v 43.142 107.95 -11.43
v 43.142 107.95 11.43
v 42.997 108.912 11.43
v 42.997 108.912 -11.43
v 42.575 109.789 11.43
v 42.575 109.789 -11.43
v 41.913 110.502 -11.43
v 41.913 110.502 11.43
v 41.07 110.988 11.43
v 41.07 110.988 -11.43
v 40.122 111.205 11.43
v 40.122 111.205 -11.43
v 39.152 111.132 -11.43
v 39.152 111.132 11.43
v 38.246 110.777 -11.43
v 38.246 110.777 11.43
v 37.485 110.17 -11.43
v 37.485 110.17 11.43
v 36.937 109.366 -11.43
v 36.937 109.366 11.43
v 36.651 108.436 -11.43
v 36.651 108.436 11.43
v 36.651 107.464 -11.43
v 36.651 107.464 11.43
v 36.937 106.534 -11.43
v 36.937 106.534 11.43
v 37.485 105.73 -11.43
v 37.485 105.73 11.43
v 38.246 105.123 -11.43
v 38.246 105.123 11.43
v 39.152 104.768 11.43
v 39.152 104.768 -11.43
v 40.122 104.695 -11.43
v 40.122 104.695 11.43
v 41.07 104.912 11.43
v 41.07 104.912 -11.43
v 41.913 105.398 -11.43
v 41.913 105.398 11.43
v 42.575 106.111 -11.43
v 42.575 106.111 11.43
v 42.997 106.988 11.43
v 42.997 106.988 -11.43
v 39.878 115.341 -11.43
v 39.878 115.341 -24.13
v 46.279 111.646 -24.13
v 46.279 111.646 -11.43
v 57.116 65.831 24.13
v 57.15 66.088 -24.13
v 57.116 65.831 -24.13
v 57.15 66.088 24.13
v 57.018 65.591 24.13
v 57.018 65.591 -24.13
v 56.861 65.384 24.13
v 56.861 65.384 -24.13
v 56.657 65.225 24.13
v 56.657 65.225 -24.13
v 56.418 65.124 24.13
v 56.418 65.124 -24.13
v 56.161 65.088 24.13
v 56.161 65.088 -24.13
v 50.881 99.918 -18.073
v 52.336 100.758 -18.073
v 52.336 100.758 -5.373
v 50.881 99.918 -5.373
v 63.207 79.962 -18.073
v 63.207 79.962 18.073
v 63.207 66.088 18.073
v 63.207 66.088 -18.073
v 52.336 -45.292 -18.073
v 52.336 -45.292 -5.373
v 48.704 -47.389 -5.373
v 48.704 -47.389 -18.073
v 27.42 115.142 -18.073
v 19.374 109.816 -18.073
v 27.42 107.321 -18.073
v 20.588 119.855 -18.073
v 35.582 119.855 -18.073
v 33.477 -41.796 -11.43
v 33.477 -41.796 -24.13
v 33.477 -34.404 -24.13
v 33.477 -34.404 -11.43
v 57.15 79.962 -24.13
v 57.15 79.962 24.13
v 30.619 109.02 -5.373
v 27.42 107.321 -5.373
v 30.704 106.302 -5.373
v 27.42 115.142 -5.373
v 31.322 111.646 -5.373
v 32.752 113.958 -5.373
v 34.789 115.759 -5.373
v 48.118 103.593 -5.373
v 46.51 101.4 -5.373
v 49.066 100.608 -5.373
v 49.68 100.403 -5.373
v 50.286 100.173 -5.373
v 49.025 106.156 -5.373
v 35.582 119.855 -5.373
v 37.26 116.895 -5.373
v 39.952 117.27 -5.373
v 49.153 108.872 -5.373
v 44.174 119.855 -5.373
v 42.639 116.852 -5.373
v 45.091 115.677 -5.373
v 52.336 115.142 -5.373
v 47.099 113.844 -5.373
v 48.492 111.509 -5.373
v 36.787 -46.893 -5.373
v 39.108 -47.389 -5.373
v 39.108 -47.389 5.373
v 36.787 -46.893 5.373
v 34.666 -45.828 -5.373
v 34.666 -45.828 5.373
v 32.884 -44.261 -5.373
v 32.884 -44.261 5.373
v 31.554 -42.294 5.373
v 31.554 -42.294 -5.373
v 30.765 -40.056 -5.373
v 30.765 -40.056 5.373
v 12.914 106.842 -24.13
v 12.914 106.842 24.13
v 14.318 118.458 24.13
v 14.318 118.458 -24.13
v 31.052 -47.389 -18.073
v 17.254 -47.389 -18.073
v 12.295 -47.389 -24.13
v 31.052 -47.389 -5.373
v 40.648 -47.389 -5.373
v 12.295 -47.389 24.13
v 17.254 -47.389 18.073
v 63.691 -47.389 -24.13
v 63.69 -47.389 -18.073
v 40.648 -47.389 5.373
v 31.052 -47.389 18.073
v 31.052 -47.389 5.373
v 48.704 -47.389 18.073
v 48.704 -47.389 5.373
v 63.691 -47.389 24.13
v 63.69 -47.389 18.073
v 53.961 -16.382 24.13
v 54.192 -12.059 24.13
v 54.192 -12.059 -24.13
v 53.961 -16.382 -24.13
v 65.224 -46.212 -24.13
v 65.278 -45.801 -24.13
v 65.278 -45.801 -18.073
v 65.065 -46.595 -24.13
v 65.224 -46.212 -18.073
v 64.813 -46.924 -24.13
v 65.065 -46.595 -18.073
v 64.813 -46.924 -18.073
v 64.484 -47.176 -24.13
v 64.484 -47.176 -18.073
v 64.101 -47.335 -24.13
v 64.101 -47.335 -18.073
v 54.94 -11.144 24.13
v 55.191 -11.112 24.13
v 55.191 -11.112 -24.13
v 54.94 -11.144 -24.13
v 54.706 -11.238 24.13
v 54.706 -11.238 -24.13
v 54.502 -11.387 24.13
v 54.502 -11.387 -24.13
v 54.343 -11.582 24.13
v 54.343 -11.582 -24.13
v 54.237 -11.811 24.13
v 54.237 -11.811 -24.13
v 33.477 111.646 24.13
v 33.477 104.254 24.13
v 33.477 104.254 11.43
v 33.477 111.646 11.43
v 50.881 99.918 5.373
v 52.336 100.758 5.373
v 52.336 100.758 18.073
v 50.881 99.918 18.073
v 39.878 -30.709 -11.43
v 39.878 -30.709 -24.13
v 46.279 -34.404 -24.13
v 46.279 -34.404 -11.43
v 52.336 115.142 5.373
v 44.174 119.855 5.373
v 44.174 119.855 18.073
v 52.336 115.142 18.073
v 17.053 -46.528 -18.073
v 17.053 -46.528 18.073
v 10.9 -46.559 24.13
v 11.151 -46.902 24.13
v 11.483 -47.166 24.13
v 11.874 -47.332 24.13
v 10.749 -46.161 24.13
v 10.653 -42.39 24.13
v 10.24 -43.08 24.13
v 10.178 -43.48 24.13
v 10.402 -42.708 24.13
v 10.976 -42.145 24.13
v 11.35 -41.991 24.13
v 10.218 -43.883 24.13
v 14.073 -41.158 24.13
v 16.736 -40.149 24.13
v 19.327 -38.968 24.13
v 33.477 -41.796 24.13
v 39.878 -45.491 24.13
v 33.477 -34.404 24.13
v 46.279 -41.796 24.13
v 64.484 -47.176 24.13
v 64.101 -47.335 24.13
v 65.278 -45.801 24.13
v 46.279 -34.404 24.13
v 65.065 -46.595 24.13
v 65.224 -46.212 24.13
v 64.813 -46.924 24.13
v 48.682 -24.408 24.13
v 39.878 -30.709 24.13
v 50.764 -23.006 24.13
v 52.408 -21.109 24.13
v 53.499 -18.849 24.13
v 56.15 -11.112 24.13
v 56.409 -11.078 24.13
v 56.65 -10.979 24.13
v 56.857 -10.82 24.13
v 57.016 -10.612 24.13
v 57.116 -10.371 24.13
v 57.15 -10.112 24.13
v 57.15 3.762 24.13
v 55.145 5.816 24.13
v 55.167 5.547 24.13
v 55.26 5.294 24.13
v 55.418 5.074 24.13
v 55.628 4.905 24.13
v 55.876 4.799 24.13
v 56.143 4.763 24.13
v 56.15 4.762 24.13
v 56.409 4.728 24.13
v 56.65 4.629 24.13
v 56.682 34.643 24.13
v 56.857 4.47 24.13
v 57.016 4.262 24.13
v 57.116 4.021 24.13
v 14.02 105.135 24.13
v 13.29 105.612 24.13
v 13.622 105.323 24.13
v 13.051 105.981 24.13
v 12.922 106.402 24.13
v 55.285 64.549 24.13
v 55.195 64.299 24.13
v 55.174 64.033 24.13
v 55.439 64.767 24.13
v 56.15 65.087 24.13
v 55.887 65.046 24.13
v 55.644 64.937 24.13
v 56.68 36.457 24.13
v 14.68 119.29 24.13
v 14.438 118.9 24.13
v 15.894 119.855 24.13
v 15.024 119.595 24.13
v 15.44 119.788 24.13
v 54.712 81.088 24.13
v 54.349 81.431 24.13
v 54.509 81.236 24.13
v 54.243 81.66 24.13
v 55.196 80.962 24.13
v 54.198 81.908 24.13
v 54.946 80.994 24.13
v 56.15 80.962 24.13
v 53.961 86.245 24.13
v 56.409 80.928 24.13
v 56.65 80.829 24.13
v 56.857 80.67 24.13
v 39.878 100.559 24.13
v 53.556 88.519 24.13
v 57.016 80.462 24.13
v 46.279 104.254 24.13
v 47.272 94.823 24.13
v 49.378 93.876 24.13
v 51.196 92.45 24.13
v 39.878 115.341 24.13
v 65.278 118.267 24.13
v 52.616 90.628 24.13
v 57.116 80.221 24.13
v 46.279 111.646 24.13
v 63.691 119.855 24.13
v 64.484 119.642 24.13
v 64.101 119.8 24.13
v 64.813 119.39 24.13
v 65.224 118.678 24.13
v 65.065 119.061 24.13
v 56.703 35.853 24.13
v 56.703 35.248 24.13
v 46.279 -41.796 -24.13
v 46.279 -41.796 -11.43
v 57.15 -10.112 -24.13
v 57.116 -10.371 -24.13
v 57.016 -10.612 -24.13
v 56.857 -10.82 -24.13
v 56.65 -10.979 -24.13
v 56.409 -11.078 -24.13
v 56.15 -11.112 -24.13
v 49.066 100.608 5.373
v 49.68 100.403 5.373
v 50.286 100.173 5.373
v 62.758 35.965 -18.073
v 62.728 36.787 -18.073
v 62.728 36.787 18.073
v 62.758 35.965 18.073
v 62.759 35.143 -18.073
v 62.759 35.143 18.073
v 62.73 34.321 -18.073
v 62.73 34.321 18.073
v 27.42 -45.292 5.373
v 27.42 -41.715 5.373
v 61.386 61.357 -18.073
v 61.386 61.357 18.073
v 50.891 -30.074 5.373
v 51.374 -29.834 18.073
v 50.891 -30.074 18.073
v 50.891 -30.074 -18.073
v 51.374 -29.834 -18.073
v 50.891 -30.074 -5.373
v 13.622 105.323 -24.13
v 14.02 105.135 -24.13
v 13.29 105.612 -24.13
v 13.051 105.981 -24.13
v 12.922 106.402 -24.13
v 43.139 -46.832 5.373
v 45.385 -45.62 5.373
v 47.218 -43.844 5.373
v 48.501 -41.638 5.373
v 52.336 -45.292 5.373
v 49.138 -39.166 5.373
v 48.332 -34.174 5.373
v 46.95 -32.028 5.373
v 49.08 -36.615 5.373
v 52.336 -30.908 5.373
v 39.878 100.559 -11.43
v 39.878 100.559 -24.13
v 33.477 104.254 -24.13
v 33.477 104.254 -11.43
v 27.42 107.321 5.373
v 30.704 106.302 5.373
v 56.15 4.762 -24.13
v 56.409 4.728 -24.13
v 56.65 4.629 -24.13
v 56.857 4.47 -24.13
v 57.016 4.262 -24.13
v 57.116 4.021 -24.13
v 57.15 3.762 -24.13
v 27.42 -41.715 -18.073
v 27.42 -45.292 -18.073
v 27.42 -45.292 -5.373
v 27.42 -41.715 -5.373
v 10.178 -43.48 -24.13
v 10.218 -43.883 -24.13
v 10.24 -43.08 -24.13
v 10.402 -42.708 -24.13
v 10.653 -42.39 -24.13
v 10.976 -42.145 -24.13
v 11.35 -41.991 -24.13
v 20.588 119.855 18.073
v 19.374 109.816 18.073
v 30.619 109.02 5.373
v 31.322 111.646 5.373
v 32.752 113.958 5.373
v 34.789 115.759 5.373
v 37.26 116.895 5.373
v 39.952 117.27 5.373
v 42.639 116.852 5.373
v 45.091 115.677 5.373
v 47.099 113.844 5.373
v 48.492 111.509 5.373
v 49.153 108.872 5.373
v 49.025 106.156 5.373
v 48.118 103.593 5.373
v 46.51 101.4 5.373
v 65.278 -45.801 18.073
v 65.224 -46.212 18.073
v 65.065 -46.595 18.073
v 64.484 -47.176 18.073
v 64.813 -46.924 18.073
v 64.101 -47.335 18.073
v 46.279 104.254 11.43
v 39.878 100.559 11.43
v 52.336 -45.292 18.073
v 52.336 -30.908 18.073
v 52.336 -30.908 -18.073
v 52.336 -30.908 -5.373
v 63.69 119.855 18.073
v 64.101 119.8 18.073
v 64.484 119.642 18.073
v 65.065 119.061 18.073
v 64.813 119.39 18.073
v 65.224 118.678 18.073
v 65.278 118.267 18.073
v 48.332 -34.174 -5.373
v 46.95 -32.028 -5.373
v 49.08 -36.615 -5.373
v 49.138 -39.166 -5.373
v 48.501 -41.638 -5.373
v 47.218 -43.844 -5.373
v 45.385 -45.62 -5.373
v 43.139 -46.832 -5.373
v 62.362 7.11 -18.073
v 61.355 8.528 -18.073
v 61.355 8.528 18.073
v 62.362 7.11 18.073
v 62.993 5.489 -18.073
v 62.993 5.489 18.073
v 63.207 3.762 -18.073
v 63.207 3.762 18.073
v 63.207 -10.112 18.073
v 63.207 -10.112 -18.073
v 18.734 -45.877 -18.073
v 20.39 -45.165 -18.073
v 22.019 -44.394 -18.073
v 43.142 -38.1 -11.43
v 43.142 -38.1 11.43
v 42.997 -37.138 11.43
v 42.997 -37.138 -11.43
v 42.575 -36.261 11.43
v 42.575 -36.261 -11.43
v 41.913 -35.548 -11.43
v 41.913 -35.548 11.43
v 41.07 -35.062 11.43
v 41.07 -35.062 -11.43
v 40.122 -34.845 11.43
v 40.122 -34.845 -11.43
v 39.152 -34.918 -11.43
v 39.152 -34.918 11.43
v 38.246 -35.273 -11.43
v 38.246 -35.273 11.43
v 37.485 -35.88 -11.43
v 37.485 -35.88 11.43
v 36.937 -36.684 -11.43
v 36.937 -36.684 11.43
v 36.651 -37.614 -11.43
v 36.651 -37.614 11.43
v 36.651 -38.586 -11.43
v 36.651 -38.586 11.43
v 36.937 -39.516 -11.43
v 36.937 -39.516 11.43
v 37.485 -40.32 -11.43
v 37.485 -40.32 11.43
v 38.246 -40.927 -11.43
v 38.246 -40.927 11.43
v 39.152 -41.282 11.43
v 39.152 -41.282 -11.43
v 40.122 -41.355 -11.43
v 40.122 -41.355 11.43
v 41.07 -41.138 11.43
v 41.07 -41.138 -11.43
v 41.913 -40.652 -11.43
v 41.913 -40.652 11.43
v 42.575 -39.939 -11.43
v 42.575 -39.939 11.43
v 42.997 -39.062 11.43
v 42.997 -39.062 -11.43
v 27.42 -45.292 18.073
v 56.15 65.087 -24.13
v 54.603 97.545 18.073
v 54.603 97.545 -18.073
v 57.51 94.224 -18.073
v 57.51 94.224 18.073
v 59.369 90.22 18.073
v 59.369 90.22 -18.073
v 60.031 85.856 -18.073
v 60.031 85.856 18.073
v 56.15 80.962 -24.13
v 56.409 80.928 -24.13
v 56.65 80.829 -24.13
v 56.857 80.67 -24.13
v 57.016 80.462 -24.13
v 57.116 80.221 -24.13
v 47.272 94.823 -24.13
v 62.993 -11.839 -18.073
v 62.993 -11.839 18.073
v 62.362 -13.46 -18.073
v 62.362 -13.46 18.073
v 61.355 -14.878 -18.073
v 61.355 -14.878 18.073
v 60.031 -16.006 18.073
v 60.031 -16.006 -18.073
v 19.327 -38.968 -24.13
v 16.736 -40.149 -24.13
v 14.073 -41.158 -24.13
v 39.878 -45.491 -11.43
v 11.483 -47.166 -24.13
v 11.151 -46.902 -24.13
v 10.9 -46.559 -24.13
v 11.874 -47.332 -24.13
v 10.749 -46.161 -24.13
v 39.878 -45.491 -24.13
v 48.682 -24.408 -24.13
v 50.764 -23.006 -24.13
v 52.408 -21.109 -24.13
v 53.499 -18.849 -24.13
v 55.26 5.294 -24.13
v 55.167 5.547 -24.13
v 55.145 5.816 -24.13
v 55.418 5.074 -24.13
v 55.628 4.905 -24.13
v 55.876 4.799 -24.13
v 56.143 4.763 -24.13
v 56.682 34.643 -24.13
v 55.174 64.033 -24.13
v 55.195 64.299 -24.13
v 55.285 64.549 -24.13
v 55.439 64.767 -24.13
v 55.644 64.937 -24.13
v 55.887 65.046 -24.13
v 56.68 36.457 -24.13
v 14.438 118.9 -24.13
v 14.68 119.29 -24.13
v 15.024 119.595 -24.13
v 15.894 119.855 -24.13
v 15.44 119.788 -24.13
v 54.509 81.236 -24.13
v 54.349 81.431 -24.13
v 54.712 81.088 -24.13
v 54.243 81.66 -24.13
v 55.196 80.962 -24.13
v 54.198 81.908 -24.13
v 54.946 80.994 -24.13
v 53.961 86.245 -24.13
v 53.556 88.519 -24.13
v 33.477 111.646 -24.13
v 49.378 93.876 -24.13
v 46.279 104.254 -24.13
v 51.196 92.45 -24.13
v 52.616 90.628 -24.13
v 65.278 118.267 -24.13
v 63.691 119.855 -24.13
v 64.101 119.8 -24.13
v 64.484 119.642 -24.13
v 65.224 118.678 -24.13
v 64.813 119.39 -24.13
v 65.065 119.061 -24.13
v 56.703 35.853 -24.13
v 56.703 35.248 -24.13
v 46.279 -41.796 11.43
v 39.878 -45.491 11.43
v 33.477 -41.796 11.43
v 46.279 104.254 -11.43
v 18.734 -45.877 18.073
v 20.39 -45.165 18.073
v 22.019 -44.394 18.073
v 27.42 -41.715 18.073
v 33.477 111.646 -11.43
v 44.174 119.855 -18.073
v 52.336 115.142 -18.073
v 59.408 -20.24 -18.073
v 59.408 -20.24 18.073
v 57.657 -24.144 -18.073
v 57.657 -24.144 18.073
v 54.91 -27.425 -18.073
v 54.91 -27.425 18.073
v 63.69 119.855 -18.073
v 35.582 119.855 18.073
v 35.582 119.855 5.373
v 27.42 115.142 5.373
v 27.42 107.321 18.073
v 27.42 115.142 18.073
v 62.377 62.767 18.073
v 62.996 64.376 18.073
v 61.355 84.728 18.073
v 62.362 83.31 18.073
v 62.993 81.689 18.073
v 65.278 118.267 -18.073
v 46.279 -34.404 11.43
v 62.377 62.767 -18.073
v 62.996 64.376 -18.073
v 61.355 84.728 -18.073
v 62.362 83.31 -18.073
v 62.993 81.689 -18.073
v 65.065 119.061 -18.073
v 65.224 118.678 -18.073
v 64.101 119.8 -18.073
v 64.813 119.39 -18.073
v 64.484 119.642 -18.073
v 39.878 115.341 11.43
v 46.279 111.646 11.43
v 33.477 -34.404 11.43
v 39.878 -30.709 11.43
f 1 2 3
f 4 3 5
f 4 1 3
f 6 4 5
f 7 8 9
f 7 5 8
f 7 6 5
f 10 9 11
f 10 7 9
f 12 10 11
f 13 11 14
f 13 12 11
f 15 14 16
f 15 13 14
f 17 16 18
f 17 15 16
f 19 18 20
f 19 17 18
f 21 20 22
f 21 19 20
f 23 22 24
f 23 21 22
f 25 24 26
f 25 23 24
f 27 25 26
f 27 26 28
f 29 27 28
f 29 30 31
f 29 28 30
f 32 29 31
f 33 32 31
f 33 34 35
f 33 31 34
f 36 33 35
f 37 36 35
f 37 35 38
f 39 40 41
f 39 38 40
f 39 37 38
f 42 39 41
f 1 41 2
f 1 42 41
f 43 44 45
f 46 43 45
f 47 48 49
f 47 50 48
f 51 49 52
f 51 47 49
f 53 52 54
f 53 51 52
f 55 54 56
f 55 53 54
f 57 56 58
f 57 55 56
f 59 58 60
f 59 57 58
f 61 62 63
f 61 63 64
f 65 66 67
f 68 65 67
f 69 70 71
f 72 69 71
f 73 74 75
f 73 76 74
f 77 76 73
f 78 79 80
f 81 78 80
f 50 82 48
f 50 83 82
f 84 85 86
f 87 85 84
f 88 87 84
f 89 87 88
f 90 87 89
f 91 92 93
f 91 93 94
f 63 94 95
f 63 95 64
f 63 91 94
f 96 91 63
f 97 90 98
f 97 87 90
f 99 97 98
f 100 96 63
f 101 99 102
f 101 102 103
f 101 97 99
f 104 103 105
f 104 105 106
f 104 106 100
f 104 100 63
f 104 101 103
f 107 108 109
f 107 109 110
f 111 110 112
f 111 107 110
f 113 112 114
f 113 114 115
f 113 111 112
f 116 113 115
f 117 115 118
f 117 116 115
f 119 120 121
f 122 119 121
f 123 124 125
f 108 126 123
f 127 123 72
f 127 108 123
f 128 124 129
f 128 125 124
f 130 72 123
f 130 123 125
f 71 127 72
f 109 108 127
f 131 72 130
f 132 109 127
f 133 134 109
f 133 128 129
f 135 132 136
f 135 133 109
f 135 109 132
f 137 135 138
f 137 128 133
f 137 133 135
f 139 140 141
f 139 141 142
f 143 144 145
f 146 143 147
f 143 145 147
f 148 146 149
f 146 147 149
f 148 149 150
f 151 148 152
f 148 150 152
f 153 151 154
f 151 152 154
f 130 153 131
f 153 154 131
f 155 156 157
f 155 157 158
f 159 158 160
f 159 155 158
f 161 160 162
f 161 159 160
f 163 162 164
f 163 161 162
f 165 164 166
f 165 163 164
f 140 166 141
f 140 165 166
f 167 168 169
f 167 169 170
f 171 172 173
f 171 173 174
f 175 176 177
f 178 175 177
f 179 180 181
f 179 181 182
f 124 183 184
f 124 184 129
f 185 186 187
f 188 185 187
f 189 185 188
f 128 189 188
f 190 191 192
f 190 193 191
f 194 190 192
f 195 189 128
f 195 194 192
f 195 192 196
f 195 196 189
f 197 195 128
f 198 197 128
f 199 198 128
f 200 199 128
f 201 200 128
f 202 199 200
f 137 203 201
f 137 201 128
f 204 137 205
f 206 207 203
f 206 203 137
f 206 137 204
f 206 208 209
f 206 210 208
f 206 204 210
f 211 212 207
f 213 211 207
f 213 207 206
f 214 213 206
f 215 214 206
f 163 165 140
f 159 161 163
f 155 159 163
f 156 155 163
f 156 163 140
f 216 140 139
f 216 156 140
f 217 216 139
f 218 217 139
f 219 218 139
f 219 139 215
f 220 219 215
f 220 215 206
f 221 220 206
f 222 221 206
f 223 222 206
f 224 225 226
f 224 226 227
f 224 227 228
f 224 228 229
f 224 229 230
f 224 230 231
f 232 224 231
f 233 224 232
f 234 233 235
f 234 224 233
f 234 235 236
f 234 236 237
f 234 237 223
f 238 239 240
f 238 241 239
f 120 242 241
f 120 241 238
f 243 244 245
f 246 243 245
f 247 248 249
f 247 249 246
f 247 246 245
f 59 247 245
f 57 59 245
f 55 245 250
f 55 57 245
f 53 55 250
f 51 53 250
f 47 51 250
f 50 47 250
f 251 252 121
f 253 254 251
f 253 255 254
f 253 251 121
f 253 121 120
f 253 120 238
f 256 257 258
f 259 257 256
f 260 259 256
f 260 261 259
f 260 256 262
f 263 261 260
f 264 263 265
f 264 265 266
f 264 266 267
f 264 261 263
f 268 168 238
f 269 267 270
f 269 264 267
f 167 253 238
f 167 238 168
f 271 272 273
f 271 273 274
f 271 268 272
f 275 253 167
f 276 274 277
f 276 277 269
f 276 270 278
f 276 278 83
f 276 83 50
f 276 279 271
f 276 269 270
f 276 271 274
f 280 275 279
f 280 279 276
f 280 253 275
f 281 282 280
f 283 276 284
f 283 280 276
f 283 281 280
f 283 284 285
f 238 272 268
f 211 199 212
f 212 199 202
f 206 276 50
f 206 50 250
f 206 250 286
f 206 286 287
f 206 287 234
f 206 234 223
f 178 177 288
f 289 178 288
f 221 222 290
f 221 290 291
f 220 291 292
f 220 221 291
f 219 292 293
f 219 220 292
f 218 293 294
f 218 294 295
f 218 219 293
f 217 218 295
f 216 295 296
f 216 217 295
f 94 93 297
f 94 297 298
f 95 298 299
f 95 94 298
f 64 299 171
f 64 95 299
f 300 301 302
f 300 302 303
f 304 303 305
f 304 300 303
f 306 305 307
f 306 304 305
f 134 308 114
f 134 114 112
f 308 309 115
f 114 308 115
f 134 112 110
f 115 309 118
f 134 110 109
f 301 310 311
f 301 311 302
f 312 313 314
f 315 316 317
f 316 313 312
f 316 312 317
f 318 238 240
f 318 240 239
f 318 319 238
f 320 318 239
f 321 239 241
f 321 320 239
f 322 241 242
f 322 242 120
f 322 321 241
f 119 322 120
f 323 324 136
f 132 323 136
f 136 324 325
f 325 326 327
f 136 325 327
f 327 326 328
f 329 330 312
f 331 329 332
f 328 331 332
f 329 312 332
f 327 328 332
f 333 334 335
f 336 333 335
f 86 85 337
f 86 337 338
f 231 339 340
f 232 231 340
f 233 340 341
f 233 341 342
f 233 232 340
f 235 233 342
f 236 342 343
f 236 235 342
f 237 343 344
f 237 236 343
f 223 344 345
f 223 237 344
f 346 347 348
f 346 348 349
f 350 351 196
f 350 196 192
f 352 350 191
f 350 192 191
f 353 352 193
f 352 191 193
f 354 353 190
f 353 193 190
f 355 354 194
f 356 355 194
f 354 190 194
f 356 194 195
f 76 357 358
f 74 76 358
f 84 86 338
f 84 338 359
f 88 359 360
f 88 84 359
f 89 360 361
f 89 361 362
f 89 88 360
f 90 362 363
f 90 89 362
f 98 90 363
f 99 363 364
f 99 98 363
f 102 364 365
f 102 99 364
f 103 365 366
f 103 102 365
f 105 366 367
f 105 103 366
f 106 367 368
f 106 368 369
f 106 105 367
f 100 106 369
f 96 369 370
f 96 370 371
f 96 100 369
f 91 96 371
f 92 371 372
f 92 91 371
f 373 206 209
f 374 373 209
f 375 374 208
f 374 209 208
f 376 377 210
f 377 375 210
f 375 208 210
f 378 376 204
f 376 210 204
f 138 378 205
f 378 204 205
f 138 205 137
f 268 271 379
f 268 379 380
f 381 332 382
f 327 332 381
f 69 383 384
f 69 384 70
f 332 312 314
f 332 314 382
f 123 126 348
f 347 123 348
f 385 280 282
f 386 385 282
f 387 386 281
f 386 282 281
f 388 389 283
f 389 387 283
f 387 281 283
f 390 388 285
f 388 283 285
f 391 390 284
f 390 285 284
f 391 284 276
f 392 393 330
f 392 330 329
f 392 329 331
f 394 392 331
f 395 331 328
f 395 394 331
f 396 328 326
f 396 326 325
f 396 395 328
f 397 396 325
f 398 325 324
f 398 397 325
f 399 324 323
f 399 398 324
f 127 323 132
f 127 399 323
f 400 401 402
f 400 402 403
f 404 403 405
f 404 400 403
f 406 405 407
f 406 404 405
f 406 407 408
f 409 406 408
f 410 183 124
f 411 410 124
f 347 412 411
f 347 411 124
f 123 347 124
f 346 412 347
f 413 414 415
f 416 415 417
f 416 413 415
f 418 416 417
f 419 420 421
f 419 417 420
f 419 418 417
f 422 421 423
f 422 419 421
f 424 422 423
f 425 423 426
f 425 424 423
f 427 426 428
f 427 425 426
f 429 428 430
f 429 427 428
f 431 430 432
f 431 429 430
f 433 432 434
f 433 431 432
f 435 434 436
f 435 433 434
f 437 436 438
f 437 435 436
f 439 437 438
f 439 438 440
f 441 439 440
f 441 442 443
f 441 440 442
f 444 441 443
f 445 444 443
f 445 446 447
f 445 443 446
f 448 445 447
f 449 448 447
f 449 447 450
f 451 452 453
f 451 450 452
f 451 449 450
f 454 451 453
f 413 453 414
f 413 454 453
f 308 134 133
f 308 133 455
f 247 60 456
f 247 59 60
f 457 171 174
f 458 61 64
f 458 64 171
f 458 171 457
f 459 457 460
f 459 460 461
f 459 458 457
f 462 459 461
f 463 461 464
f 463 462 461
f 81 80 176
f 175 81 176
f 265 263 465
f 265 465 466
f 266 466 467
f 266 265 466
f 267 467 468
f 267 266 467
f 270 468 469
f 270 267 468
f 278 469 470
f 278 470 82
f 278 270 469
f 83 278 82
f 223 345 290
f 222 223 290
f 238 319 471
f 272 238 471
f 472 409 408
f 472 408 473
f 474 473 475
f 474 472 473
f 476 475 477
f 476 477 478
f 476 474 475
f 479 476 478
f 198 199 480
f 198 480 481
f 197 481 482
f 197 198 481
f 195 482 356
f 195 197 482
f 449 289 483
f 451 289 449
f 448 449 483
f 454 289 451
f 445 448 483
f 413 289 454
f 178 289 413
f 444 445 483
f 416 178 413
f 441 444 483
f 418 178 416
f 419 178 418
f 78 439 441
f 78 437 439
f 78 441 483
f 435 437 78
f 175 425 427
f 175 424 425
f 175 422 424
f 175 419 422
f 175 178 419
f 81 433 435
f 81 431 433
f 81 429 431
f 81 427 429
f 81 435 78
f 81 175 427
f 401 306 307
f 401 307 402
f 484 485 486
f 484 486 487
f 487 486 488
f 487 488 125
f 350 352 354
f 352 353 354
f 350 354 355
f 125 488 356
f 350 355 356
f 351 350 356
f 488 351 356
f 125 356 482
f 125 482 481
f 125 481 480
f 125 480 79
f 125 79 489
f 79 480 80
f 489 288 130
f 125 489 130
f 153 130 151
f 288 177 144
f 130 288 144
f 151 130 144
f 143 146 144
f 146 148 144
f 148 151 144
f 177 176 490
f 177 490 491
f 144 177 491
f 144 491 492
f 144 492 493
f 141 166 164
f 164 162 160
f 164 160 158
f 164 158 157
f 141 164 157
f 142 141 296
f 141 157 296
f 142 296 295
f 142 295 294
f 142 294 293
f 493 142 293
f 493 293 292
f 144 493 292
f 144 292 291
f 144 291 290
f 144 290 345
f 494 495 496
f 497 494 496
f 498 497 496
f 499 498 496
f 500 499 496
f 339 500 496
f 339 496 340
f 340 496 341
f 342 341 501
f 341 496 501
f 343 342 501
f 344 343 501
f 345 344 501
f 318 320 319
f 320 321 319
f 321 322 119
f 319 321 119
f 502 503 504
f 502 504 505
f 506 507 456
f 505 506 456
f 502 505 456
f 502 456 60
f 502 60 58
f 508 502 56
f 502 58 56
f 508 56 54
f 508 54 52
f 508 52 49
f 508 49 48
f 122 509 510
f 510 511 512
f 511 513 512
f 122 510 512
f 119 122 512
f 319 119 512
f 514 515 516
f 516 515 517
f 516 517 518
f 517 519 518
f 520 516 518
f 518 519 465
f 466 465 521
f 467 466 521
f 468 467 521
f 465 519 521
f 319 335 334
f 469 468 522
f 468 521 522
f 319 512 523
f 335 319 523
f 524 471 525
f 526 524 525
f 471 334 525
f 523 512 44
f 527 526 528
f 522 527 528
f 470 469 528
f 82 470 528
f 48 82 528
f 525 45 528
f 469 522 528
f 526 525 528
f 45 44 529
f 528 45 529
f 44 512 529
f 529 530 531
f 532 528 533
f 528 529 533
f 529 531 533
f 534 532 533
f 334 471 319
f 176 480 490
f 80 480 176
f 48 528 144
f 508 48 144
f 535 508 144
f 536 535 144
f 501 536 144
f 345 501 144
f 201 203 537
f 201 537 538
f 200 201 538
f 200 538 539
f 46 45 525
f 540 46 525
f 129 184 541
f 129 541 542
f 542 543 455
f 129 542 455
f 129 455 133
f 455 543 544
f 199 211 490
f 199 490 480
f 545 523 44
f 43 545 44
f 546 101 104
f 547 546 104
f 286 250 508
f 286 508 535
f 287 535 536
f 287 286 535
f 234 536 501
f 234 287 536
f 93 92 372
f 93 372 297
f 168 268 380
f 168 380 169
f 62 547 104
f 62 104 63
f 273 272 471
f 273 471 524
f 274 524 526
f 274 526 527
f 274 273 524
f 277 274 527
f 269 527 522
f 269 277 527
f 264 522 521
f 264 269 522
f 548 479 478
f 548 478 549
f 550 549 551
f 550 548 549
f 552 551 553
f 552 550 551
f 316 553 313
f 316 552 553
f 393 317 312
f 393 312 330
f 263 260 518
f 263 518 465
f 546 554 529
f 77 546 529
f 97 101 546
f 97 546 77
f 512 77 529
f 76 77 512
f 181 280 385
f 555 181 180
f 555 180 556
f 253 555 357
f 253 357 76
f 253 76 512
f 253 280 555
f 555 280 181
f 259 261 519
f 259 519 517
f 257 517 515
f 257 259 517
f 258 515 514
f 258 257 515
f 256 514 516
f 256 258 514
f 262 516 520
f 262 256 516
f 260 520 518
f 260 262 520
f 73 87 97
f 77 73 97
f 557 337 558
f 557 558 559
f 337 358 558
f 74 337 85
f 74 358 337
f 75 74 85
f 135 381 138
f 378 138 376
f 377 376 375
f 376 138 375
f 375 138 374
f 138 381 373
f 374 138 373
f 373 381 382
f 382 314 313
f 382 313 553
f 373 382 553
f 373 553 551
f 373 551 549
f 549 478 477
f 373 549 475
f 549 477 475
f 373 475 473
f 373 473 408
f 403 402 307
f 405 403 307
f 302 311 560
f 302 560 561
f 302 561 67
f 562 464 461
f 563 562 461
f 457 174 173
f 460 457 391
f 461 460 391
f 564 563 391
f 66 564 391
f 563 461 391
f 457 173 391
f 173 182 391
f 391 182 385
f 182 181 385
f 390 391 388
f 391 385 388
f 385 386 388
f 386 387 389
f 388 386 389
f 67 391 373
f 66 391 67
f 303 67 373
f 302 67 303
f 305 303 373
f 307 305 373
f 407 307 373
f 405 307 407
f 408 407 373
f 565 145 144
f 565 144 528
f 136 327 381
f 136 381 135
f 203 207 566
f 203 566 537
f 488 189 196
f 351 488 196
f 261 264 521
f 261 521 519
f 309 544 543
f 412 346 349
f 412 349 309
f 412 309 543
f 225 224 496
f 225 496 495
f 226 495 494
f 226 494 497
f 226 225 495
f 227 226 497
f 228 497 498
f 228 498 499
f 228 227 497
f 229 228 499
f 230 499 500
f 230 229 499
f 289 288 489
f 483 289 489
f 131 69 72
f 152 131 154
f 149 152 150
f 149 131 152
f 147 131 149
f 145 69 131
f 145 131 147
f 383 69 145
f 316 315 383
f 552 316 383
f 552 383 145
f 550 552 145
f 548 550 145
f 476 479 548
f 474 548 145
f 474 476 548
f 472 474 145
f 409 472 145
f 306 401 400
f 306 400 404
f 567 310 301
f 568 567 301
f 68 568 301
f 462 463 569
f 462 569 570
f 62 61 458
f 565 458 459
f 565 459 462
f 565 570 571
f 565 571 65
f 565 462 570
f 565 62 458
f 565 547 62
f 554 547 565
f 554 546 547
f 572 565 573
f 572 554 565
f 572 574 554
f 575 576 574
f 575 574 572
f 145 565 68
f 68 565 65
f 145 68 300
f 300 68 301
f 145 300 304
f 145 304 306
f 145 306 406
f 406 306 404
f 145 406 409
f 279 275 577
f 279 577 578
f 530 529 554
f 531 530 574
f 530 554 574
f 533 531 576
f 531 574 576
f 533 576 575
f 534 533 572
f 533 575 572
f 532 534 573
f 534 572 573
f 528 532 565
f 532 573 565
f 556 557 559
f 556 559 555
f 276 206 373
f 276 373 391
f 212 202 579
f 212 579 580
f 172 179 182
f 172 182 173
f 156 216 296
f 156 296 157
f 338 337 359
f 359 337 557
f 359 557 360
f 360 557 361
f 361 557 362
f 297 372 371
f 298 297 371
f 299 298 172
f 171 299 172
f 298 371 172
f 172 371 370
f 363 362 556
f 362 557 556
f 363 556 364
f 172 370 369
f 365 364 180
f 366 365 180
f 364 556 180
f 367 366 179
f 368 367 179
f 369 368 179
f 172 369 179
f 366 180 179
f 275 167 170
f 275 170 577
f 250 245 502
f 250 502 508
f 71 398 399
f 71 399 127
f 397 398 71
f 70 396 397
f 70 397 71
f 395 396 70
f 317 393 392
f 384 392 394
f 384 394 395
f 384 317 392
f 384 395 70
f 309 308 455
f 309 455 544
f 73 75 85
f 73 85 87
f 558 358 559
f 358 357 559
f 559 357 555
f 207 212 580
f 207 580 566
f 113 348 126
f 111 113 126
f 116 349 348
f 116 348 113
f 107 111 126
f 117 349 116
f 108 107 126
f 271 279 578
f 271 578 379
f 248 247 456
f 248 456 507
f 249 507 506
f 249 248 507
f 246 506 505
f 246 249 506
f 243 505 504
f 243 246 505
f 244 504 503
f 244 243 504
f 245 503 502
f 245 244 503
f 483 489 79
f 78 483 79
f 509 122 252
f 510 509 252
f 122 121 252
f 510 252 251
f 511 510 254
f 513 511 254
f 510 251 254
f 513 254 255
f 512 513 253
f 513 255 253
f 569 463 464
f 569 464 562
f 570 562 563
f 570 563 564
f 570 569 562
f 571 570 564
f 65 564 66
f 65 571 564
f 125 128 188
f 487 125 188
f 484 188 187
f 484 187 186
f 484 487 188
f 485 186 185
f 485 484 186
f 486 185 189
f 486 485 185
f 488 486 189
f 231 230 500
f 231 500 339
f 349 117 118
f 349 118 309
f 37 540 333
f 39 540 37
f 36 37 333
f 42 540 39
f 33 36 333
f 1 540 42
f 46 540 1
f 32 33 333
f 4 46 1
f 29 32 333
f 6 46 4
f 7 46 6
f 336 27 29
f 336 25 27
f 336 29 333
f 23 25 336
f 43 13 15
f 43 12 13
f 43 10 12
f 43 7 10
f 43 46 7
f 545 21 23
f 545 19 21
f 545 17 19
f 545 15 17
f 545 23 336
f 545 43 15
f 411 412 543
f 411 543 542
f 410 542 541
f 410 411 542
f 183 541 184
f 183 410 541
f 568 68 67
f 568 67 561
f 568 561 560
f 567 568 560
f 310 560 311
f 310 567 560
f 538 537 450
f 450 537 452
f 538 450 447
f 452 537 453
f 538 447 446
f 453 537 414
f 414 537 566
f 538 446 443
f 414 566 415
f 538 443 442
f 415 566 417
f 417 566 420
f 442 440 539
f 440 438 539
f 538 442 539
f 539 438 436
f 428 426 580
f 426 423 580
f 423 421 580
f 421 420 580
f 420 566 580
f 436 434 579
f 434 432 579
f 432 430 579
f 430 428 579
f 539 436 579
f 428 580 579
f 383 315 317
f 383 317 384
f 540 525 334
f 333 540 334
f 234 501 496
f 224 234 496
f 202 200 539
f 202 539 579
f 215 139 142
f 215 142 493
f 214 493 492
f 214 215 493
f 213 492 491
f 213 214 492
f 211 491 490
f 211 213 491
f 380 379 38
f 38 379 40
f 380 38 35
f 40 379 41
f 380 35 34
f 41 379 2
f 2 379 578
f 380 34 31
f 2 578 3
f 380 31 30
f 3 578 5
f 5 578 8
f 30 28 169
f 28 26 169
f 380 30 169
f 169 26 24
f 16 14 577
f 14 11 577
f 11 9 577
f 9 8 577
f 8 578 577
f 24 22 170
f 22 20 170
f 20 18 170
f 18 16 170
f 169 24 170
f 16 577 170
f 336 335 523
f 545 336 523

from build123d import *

# Parameters (mm, degrees)
BOSS_EXTRUDE1_DEPTH     = 24.13
CUT_EXTRUDE1_DEPTH      = 139.595056638
CUT_EXTRUDE1_DEPTH_BACK = 139.595056638
FILLET1_R               = 1.5875
CUT_EXTRUDE2_DEPTH      = 12.7
CUT_EXTRUDE3_DEPTH      = 139.595056638
CUT_EXTRUDE3_DEPTH_BACK = 139.595056638
SKETCH4_R               = 3.2639
SHELL1_START            = -18.073116
SHELL1_DEPTH            = 36.146232
SHELL1_START_2          = -5.373116
SHELL1_2_DEPTH          = 10.746232


# Read off the part's stored shape, not the designer's step: Shell1
with BuildPart() as part:
    # Sketch1 → Boss-Extrude1 (new, symmetric)
    with BuildSketch(Plane.XY):
        with BuildLine():
            Line((56.161313585, 65.087564001), (56.15, 65.087371974))
            ThreePointArc((56.15, 65.087371974), (55.438759683, 64.766920639), (55.174115771, 64.033084522))
            Line((55.174115771, 64.033084522), (56.680450554, 36.457041128))
            ThreePointArc((56.680450554, 36.457041128), (56.705496383, 35.550244887), (56.681639728, 34.643416582))
            Line((56.681639728, 34.643416582), (55.144848554, 5.815734008))
            ThreePointArc((55.144848554, 5.815734008), (55.417746823, 5.074471658), (56.143430652, 4.7625))
            Line((56.143430652, 4.7625), (56.149999968, 4.762499984))
            ThreePointArc((56.149999968, 4.762499984), (56.857106771, 4.469606766), (57.15, 3.762499968))
            Line((57.15, 3.762499968), (57.15, -10.112499968))
            ThreePointArc((57.15, -10.112499968), (56.857106771, -10.819606766), (56.149999968, -11.112499984))
            Line((56.149999968, -11.112499984), (55.190522202, -11.1125))
            ThreePointArc((55.190522202, -11.1125), (54.502493828, -11.386816202), (54.191940103, -12.059266056))
            Line((54.191940103, -12.059266056), (53.961494186, -16.382053603))
            ThreePointArc((53.961494186, -16.382053603), (52.407837698, -21.109352316), (48.682296217, -24.408070592))
            Line((48.682296217, -24.408070592), (19.327486058, -38.967689038))
            ThreePointArc((19.327486058, -38.967689038), (0, -43.4975), (-19.327486058, -38.967689038))
            Line((-19.327486058, -38.967689038), (-19.327486058, -47.388950103))
            Line((-19.327486058, -47.388950103), (65.278, -47.388950103))
            Line((65.278, -47.388950103), (65.278, 119.854559949))
            Line((65.278, 119.854559949), (-4.702524006, 119.854559949))
            Line((-4.702524006, 119.854559949), (-4.702524006, 108.02491605))
            ThreePointArc((-4.702524006, 108.02491605), (0, 108.7374), (4.702524006, 108.02491605))
            Line((4.702524006, 108.02491605), (47.271514403, 94.82250963))
            ThreePointArc((47.271514403, 94.82250963), (51.961130003, 91.582350175), (53.960821068, 86.244526329))
            Line((53.960821068, 86.244526329), (54.197705155, 81.907956584))
            ThreePointArc((54.197705155, 81.907956584), (54.508664182, 81.236365226), (55.196216585, 80.9625))
            Line((55.196216585, 80.9625), (56.149999984, 80.962499984))
            ThreePointArc((56.149999984, 80.962499984), (56.857106777, 80.669606761), (57.15, 79.962499968))
            Line((57.15, 79.962499968), (57.15, 66.087500032))
            ThreePointArc((57.15, 66.087500032), (56.8610955, 65.384404568), (56.161313585, 65.087564001))
        make_face()
    extrude(amount=BOSS_EXTRUDE1_DEPTH, both=True)

    # Sketch2 → Cut-Extrude1 (cut, two sides: drawn at the far end of the back side and taken through both)
    with BuildSketch(Plane.XY.offset(-CUT_EXTRUDE1_DEPTH_BACK)):
        Polygon((0, 0), (16.649604997, 137.747881839), (-33.336773011, 132.313158031), (-32.126746787, -67.704176811), (15.765326083, -67.704176811), align=None)
    extrude(amount=CUT_EXTRUDE1_DEPTH + CUT_EXTRUDE1_DEPTH_BACK, mode=Mode.SUBTRACT)

    # Fillet1
    fillet1_edges = [part.edges().sort_by_distance(p)[0] for p in [
        (65.278, 119.854559949, 0),
        (65.278, -47.388950103, 0),
        (11.034802966, -47.388950103, 0),
        (9.864742858, -42.364128158, 0),
        (12.755119811, 105.527472687, 0),
        (14.486836775, 119.854559949, 0),
    ]]
    fillet(fillet1_edges, radius=FILLET1_R)

    # Sketch3 → Cut-Extrude2 (cut)
    with BuildSketch(Plane(origin=(0, 0, -24.13), x_dir=(-1, 0, 0), z_dir=(0, 0, -1))):
        Polygon((-39.878, -30.708992794), (-46.2788, -34.404496397), (-46.2788, -41.795503603), (-39.878, -45.491007206), (-33.4772, -41.795503603), (-33.4772, -34.404496397), align=None)
        Polygon((-33.4772, 111.645503603), (-39.878, 115.341007206), (-46.2788, 111.645503603), (-46.2788, 104.254496397), (-39.878, 100.558992794), (-33.4772, 104.254496397), align=None)
    cut_extrude2 = extrude(amount=-CUT_EXTRUDE2_DEPTH, mode=Mode.SUBTRACT)

    # Mirror1: Cut-Extrude2 across plane
    add(cut_extrude2.mirror(Plane.XY), mode=Mode.SUBTRACT)

    # Sketch4 → Cut-Extrude3 (cut, two sides: drawn at the far end of the back side and taken through both)
    with BuildSketch(Plane.XY.offset(-CUT_EXTRUDE3_DEPTH_BACK)):
        with Locations((39.878, 107.95)):
            Circle(SKETCH4_R)
        with Locations((39.878, -38.1)):
            Circle(SKETCH4_R)
    extrude(amount=CUT_EXTRUDE3_DEPTH + CUT_EXTRUDE3_DEPTH_BACK, mode=Mode.SUBTRACT)

    # Shell1 outline → Shell1 (cut)
    with BuildSketch(Plane.XY.offset(SHELL1_START)):
        Polygon((19.374447508, 109.816041015), (27.420316, 107.32068407), (27.420316, 115.142447211), (35.581934673, 119.854559949), (20.587804641, 119.854559949), align=None)
        with BuildLine():
            Line((52.335684, 100.757552789), (50.881166896, 99.917786948))
            ThreePointArc((50.881166896, 99.917786948), (57.51024809, 94.223530979), (60.031332227, 85.856129752))
            ThreePointArc((60.031332227, 85.856129752), (62.362476281, 83.309849707), (63.206884, 79.962499968))
            Line((63.206884, 79.962499968), (63.206884008, 66.087500032))
            ThreePointArc((63.206884008, 66.087500032), (62.736011515, 63.552926254), (61.386232226, 61.356592716))
            Line((61.386232226, 61.356592716), (62.728318266, 36.787404457))
            ThreePointArc((62.728318266, 36.787404457), (62.762379081, 35.55421632), (62.729935471, 34.320984576))
            Line((62.729935471, 34.320984576), (61.354914269, 8.527841436))
            ThreePointArc((61.354914269, 8.527841436), (62.727616894, 6.318780038), (63.206884, 3.762499968))
            Line((63.206884, 3.762499968), (63.206884, -10.112499968))
            ThreePointArc((63.206884, -10.112499968), (62.362476281, -13.459849707), (60.031332227, -16.006129752))
            ThreePointArc((60.031332227, -16.006129752), (57.656879346, -24.143823794), (51.373585166, -29.834193295))
            Line((51.373585166, -29.834193295), (50.891079569, -30.073510032))
            Line((50.891079569, -30.073510032), (52.335684, -30.907552789))
            Line((52.335684, -30.907552789), (52.335684, -45.292447211))
            Line((52.335684, -45.292447211), (48.704434473, -47.388950103))
            Line((48.704434473, -47.388950103), (63.6905, -47.388950103))
            ThreePointArc((63.6905, -47.388950103), (64.813032015, -46.923982118), (65.278, -45.801450103))
            Line((65.278, -45.801450103), (65.278, 118.267059949))
            ThreePointArc((65.278, 118.267059949), (64.813032015, 119.389591964), (63.6905, 119.854559949))
            Line((63.6905, 119.854559949), (44.174065327, 119.854559949))
            Line((44.174065327, 119.854559949), (52.335684, 115.142447211))
            Line((52.335684, 115.142447211), (52.335684, 100.757552789))
        make_face()
        with BuildLine():
            Line((17.253727402, -47.388950103), (31.051565527, -47.388950103))
            Line((31.051565527, -47.388950103), (27.420316, -45.292447211))
            Line((27.420316, -45.292447211), (27.420316, -41.714715011))
            Line((27.420316, -41.714715011), (22.018775007, -44.39381174))
            ThreePointArc((22.018775007, -44.39381174), (19.565089882, -45.528499114), (17.053178169, -46.527691625))
            Line((17.053178169, -46.527691625), (17.253727402, -47.388950103))
        make_face()
    extrude(amount=SHELL1_DEPTH, mode=Mode.SUBTRACT)

    # Shell1 2 outline → Shell1 2 (cut)
    with BuildSketch(Plane.XY.offset(SHELL1_START_2)):
        with BuildLine():
            Line((31.051565527, -47.388950103), (39.108311519, -47.388950103))
            ThreePointArc((39.108311519, -47.388950103), (33.724832418, -45.101110132), (30.764746274, -40.055919453))
            Line((30.764746274, -40.055919453), (27.420316, -41.714715011))
            Line((27.420316, -41.714715011), (27.420316, -45.292447211))
            Line((27.420316, -45.292447211), (31.051565527, -47.388950103))
        make_face()
        with BuildLine():
            ThreePointArc((30.704014451, 106.302273224), (42.639021135, 116.852459024), (46.509623897, 101.40029933))
            Line((46.509623897, 101.40029933), (49.065696603, 100.607555354))
            ThreePointArc((49.065696603, 100.607555354), (49.984188595, 100.290983166), (50.881166896, 99.917786948))
            Line((50.881166896, 99.917786948), (52.335684, 100.757552789))
            Line((52.335684, 100.757552789), (52.335684, 115.142447211))
            Line((52.335684, 115.142447211), (44.174065327, 119.854559949))
            Line((44.174065327, 119.854559949), (35.581934673, 119.854559949))
            Line((35.581934673, 119.854559949), (27.420316, 115.142447211))
            Line((27.420316, 115.142447211), (27.420316, 107.32068407))
            Line((27.420316, 107.32068407), (30.704014451, 106.302273224))
        make_face()
        with BuildLine():
            Line((40.647688481, -47.388950103), (48.704434473, -47.388950103))
            Line((48.704434473, -47.388950103), (52.335684, -45.292447211))
            Line((52.335684, -45.292447211), (52.335684, -30.907552789))
            Line((52.335684, -30.907552789), (50.891079569, -30.073510032))
            Line((50.891079569, -30.073510032), (46.949876749, -32.028297304))
            ThreePointArc((46.949876749, -32.028297304), (48.501221551, -41.637946362), (40.647688481, -47.388950103))
        make_face()
    extrude(amount=SHELL1_2_DEPTH, mode=Mode.SUBTRACT)


solid = part.part
